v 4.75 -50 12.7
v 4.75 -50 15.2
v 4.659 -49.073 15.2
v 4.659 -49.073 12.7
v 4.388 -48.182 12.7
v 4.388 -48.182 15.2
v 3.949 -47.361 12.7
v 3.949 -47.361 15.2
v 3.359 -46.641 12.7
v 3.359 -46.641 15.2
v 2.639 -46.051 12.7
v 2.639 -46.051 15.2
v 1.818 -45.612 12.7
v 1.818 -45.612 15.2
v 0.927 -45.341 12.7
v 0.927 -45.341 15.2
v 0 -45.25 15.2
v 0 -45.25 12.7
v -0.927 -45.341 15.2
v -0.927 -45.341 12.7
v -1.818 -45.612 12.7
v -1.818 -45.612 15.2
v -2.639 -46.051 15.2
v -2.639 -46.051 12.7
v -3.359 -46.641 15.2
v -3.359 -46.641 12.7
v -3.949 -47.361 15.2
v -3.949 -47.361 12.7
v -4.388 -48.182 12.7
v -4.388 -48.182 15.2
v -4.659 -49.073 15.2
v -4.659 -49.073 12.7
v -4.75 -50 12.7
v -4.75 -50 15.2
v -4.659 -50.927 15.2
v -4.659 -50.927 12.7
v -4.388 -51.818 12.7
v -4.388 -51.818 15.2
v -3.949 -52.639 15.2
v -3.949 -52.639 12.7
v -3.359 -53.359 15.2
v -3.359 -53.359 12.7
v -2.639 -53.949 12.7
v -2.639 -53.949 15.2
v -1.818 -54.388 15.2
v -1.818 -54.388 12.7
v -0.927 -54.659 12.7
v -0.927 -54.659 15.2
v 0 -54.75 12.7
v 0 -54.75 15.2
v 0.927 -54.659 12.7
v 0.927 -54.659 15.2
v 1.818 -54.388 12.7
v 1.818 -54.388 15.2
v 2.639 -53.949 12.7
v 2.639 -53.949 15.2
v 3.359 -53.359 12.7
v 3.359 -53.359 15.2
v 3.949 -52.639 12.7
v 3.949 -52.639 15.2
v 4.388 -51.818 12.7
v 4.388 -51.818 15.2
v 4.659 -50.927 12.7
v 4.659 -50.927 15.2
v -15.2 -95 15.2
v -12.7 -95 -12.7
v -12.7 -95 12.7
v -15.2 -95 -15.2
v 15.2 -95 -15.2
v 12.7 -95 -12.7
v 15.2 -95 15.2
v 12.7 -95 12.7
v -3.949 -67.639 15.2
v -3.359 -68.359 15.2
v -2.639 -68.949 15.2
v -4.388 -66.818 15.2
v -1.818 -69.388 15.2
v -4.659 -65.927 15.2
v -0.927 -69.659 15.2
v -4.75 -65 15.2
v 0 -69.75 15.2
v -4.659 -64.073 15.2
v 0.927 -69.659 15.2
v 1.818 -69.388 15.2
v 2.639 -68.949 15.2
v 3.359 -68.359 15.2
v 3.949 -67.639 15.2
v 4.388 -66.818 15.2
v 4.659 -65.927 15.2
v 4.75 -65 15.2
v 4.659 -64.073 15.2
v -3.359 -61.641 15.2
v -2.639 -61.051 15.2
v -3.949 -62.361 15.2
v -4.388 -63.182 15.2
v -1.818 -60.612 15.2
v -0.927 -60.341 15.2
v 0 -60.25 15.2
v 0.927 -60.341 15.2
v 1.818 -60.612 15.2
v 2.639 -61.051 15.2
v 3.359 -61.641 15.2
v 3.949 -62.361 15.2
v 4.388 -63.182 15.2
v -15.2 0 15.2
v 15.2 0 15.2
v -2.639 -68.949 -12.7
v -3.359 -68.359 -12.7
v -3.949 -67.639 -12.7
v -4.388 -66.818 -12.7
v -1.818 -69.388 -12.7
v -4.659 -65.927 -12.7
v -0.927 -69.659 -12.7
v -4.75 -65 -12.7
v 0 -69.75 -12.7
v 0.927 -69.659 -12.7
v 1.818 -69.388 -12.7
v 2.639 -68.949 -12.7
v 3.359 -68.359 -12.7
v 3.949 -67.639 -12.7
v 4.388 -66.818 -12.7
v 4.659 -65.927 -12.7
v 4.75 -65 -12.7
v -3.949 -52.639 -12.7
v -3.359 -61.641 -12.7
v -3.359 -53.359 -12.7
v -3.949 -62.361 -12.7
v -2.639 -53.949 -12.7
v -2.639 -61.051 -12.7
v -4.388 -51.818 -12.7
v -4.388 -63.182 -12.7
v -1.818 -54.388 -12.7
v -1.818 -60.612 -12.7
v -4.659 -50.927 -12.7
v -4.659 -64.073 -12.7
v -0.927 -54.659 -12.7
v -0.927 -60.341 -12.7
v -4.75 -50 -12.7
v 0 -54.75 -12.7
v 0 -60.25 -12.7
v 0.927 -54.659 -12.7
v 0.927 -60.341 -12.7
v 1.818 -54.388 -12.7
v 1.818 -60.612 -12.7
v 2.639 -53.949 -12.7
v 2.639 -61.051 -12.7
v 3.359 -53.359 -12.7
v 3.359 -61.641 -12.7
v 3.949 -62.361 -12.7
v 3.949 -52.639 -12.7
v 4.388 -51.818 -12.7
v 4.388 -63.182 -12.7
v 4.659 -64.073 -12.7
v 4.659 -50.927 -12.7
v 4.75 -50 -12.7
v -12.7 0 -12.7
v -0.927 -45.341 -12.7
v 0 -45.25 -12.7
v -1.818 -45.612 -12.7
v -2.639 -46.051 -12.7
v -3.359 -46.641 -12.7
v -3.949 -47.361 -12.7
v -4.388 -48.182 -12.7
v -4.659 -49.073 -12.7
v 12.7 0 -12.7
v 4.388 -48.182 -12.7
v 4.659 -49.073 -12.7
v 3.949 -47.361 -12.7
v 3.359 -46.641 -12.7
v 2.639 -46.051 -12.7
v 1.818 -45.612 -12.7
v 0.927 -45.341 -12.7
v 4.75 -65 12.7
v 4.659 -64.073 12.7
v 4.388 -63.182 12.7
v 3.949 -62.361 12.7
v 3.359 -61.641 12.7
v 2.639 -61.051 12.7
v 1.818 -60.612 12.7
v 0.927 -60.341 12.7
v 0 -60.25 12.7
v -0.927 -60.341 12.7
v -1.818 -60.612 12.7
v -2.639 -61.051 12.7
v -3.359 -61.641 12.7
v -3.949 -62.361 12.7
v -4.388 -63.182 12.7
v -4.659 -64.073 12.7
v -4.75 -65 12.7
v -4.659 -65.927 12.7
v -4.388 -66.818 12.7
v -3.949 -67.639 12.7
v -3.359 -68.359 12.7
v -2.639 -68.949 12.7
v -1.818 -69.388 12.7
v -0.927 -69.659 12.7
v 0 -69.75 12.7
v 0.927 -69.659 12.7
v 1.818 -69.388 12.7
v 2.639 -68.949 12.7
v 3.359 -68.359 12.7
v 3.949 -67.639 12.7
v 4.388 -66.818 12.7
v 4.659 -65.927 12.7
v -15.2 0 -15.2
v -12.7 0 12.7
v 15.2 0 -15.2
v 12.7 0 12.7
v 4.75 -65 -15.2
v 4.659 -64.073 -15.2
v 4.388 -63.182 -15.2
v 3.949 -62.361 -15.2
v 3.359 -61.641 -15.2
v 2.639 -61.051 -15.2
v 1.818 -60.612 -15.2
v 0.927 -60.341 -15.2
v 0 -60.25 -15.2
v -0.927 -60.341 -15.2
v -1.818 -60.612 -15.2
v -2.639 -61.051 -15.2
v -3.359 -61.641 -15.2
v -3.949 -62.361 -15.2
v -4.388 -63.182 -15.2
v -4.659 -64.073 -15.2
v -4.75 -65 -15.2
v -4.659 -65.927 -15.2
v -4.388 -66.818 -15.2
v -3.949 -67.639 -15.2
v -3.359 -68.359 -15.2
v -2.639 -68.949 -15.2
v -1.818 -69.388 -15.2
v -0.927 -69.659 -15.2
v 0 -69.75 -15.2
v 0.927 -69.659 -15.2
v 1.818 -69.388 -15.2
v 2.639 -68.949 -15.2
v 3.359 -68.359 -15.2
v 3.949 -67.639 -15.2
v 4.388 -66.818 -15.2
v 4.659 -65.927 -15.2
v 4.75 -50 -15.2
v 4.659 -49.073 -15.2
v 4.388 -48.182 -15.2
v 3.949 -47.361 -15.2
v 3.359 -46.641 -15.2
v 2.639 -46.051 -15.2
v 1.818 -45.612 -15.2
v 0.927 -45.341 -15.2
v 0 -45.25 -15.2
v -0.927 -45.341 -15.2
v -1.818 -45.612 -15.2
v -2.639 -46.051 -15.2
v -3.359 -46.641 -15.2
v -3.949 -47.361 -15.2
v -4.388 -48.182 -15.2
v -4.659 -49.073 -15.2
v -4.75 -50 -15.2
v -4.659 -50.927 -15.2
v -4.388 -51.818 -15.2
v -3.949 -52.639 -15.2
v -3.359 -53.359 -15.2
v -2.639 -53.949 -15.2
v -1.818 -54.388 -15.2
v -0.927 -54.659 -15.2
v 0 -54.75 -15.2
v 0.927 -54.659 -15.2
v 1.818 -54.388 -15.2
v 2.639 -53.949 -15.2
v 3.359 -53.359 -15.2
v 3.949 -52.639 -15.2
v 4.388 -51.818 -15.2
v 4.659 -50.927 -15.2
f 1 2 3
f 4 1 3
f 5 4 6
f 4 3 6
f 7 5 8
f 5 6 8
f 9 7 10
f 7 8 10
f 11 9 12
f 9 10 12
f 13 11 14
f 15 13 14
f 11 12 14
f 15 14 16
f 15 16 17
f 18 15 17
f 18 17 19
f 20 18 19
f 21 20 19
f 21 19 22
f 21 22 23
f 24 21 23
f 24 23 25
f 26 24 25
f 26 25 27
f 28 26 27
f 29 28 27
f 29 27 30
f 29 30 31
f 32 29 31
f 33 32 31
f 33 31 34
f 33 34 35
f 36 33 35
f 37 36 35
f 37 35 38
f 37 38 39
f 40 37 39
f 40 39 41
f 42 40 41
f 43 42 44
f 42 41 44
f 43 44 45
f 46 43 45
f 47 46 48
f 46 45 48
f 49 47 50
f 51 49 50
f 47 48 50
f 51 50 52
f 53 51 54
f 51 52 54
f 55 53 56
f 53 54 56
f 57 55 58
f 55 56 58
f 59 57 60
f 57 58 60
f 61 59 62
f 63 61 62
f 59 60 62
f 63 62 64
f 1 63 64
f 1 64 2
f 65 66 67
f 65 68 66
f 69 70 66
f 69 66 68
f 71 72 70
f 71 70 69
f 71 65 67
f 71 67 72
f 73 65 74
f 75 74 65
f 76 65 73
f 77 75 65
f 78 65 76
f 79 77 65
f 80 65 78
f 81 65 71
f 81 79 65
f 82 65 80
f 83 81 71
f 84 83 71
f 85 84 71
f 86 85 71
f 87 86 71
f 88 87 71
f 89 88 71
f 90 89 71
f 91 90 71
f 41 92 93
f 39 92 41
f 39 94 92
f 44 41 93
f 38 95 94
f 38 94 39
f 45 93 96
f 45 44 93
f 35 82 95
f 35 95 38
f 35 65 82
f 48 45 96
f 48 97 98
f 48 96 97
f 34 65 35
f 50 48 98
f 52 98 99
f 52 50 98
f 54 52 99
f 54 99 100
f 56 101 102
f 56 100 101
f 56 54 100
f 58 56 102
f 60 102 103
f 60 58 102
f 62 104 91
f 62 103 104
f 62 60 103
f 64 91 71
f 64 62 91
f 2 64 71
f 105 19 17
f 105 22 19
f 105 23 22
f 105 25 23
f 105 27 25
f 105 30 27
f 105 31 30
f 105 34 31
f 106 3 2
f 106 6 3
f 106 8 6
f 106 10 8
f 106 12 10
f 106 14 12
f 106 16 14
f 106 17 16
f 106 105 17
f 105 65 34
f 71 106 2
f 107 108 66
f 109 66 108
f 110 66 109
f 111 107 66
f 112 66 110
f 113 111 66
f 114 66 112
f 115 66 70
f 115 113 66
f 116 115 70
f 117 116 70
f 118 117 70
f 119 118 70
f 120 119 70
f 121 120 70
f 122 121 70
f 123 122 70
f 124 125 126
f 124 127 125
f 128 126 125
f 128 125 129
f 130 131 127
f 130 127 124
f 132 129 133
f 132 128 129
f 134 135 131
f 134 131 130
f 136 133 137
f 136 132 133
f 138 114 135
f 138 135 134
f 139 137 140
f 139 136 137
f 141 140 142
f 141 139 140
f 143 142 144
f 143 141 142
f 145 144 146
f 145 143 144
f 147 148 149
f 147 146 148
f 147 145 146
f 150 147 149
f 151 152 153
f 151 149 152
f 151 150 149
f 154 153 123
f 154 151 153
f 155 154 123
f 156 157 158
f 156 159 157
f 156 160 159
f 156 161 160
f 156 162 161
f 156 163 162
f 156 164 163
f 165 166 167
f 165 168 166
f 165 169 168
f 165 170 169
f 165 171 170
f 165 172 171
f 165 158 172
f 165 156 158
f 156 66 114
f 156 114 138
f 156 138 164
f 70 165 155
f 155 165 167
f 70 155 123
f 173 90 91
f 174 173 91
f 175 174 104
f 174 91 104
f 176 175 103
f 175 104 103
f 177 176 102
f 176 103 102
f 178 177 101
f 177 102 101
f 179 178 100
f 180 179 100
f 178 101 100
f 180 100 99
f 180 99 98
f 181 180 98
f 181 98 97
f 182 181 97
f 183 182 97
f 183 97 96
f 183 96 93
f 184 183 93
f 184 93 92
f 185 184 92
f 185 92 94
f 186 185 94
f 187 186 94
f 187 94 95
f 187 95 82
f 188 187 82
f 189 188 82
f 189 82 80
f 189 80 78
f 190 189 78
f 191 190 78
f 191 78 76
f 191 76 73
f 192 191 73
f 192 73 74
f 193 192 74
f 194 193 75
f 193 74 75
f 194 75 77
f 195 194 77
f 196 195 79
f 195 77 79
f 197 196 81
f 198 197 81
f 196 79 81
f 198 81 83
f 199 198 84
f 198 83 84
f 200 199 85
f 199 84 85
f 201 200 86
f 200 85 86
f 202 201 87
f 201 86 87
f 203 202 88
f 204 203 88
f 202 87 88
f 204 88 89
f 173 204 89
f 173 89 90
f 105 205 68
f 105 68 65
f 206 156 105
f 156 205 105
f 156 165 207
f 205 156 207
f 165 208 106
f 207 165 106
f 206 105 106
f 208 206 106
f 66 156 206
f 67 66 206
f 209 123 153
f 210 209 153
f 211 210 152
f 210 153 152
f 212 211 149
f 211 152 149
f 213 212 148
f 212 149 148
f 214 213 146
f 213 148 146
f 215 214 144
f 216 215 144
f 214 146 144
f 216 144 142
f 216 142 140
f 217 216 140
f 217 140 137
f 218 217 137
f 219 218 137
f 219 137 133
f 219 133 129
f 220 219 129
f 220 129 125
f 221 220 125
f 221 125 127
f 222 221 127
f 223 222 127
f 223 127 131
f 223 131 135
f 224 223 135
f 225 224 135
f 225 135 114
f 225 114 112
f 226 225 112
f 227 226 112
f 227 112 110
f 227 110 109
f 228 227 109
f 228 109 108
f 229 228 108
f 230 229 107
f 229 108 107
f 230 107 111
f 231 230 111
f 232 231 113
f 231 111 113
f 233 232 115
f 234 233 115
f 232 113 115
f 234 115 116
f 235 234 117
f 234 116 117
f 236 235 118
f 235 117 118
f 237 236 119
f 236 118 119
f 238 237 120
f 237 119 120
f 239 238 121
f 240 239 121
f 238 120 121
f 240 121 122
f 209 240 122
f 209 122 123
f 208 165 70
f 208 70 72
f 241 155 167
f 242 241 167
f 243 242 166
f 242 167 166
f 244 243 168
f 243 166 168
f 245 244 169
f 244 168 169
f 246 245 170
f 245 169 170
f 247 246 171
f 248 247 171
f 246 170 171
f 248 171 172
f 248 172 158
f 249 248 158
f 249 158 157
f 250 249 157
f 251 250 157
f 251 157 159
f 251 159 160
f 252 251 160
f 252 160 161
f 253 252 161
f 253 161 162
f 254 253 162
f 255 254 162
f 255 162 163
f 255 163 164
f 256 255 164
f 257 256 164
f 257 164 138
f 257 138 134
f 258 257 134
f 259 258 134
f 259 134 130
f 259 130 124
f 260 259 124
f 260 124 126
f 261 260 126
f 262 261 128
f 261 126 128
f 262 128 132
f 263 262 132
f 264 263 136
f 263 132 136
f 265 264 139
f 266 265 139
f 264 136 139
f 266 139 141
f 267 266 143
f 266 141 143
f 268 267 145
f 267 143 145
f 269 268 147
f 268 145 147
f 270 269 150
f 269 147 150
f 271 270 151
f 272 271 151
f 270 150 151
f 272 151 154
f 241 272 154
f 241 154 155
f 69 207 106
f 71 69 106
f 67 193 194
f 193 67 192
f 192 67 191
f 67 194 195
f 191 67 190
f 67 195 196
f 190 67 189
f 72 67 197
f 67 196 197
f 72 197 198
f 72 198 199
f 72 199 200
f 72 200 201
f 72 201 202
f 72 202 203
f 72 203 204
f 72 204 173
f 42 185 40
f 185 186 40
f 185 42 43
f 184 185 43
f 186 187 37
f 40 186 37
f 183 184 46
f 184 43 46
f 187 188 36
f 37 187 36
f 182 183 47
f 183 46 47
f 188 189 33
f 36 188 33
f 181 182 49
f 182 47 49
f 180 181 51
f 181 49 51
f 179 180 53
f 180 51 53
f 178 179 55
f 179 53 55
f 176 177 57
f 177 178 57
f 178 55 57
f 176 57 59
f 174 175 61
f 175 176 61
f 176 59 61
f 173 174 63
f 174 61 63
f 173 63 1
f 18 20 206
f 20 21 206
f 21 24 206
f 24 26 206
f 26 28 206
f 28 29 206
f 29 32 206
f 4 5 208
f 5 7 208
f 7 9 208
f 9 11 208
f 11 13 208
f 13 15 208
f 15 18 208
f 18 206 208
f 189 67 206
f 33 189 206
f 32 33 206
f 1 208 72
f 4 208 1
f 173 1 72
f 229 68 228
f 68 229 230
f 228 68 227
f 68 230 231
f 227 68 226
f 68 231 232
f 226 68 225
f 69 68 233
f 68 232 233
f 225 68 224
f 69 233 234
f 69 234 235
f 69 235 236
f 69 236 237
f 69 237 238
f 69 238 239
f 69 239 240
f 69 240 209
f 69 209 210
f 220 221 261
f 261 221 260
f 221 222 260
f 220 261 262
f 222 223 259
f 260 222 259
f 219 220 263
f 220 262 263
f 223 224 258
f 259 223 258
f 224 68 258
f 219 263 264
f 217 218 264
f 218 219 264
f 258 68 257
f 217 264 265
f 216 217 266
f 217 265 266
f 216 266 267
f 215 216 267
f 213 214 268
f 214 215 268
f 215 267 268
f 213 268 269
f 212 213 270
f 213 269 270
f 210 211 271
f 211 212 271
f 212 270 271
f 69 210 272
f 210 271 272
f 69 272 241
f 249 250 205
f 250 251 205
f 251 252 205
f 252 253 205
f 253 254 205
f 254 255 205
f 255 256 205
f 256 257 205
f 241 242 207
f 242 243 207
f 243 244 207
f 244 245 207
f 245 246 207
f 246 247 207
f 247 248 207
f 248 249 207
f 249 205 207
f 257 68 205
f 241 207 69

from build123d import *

# Parameters (mm, degrees)
F0_W     = 30.4
F0_H     = 30.4
F1_DEPTH = 95
F2_T     = -2.5
F3_R     = 4.75
F4_DEPTH = 38.5


with BuildPart() as f1:
    # F0 (on Front) → F1 (new body)
    with BuildSketch(Plane.XZ):
        Rectangle(F0_W, F0_H)
    extrude(amount=F1_DEPTH)

    # F2
    f2_openings = [f1.faces().sort_by_distance(p)[0] for p in [
        (0, -95, 0),
        (0, 0, 0),
    ]]
    offset(amount=F2_T, openings=f2_openings)

    # F3 (on face) → F4 (cut)
    with BuildSketch(Plane.XY.offset(15.2)):
        with Locations((0, -65)):
            Circle(F3_R)
        with Locations((0, -50)):
            Circle(F3_R)
    extrude(amount=-F4_DEPTH, mode=Mode.SUBTRACT)


solid = f1.part
